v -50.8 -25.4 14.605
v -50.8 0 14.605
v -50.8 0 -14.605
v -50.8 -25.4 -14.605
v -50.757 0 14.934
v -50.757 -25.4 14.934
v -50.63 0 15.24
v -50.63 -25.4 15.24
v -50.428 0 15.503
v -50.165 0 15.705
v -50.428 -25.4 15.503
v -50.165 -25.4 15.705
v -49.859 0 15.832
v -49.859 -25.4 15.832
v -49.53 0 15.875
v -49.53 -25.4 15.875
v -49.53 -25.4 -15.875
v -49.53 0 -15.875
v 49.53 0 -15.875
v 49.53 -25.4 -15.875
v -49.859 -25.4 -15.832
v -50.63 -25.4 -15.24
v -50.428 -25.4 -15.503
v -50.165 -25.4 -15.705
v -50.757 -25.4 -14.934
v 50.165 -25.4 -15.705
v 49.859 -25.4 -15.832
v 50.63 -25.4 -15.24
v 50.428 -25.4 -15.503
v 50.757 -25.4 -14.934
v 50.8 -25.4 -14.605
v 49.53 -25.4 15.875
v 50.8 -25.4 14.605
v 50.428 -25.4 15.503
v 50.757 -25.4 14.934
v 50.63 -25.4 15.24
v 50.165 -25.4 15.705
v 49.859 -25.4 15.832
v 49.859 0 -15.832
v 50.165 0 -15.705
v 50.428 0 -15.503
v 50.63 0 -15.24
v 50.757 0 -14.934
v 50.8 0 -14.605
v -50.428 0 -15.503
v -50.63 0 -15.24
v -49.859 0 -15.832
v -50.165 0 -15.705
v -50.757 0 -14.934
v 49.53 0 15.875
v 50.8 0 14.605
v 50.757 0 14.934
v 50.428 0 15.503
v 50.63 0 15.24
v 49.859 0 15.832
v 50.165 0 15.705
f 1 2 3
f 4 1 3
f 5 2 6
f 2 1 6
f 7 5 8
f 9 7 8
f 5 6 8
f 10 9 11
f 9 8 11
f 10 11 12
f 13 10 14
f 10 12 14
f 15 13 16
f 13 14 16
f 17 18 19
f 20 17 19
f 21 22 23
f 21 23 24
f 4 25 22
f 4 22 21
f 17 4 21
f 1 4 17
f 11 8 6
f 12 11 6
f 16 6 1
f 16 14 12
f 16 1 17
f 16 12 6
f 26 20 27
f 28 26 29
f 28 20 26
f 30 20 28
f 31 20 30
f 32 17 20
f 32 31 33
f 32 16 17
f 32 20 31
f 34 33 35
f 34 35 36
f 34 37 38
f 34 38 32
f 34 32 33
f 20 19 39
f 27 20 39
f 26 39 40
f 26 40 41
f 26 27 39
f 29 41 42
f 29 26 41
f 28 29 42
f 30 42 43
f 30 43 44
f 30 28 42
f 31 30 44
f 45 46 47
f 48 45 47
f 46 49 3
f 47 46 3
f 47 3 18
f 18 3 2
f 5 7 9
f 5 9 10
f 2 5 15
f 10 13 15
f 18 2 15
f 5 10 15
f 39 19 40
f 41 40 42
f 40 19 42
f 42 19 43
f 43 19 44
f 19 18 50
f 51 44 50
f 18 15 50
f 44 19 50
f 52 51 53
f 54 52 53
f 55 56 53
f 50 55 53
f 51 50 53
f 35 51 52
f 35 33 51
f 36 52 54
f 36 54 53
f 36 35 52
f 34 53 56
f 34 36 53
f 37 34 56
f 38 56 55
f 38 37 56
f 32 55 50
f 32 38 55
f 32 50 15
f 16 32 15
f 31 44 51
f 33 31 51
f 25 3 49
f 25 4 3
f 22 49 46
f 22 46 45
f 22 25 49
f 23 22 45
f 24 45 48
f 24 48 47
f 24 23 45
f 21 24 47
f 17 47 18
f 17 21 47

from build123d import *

# Parameters (mm, degrees)
F0_W     = 6.35
F0_H     = 6.35
F1_DEPTH = 25.4
F2_R     = 1.27


with BuildPart() as f1:
    # F0 (on Front) → F1 (new body)
    with BuildSketch(Plane.XZ):
        Polygon((-50.8, 15.875), (-50.8, 9.525), (-44.45, 9.525), (-38.1, 9.525), (-38.1, 15.875), align=None)
        with Locations((-47.625, 6.35)):
            Rectangle(F0_W, F0_H)
        Polygon((-50.8, 3.175), (-50.8, -3.175), (-44.45, -3.175), (-38.1, -3.175), (-38.1, 3.175), (-44.45, 3.175), align=None)
        with Locations((-47.625, -6.35)):
            Rectangle(F0_W, F0_H)
        Polygon((-50.8, -15.875), (0, -15.875), (0, -9.525), (-6.35, -9.525), (-44.45, -9.525), (-50.8, -9.525), align=None)
        Polygon((0, -15.875), (50.8, -15.875), (50.8, -9.525), (44.45, -9.525), (6.35, -9.525), (0, -9.525), align=None)
        with Locations((3.175, -6.35)):
            Rectangle(F0_W, F0_H)
        with Locations((-3.175, -6.35)):
            Rectangle(F0_W, F0_H)
        Polygon((-6.35, -3.175), (0, -3.175), (0, 3.175), (-6.35, 3.175), (-12.7, 3.175), (-12.7, -3.175), align=None)
        Polygon((0, 3.175), (0, -3.175), (6.35, -3.175), (12.7, -3.175), (12.7, 3.175), (6.35, 3.175), align=None)
        with Locations((3.175, 6.35)):
            Rectangle(F0_W, F0_H)
        with Locations((-3.175, 6.35)):
            Rectangle(F0_W, F0_H)
        Polygon((-6.35, 9.525), (0, 9.525), (0, 15.875), (-12.7, 15.875), (-12.7, 9.525), align=None)
        Polygon((0, 15.875), (0, 9.525), (6.35, 9.525), (12.7, 9.525), (12.7, 15.875), align=None)
        Polygon((44.45, 9.525), (50.8, 9.525), (50.8, 15.875), (38.1, 15.875), (38.1, 9.525), align=None)
        with Locations((47.625, 6.35)):
            Rectangle(F0_W, F0_H)
        Polygon((44.45, -3.175), (50.8, -3.175), (50.8, 3.175), (44.45, 3.175), (38.1, 3.175), (38.1, -3.175), align=None)
        with Locations((47.625, -6.35)):
            Rectangle(F0_W, F0_H)
        Polygon((-44.45, -9.525), (-6.35, -9.525), (-6.35, -3.175), (-12.7, -3.175), (-12.7, 3.175), (-6.35, 3.175), (-6.35, 9.525), (-12.7, 9.525), (-12.7, 15.875), (-38.1, 15.875), (-38.1, 9.525), (-44.45, 9.525), (-44.45, 3.175), (-38.1, 3.175), (-38.1, -3.175), (-44.45, -3.175), align=None)
        Polygon((6.35, -9.525), (44.45, -9.525), (44.45, -3.175), (38.1, -3.175), (38.1, 3.175), (44.45, 3.175), (44.45, 9.525), (38.1, 9.525), (38.1, 15.875), (12.7, 15.875), (12.7, 9.525), (6.35, 9.525), (6.35, 3.175), (12.7, 3.175), (12.7, -3.175), (6.35, -3.175), align=None)
    extrude(amount=F1_DEPTH)

    # F2
    f2_edges = [f1.edges().sort_by_distance(p)[0] for p in [
        (-50.8, -12.7, 15.875),
        (-50.8, -12.7, -15.875),
        (50.8, -12.7, 15.875),
        (50.8, -12.7, -15.875),
    ]]
    fillet(f2_edges, radius=F2_R)


solid = f1.part
